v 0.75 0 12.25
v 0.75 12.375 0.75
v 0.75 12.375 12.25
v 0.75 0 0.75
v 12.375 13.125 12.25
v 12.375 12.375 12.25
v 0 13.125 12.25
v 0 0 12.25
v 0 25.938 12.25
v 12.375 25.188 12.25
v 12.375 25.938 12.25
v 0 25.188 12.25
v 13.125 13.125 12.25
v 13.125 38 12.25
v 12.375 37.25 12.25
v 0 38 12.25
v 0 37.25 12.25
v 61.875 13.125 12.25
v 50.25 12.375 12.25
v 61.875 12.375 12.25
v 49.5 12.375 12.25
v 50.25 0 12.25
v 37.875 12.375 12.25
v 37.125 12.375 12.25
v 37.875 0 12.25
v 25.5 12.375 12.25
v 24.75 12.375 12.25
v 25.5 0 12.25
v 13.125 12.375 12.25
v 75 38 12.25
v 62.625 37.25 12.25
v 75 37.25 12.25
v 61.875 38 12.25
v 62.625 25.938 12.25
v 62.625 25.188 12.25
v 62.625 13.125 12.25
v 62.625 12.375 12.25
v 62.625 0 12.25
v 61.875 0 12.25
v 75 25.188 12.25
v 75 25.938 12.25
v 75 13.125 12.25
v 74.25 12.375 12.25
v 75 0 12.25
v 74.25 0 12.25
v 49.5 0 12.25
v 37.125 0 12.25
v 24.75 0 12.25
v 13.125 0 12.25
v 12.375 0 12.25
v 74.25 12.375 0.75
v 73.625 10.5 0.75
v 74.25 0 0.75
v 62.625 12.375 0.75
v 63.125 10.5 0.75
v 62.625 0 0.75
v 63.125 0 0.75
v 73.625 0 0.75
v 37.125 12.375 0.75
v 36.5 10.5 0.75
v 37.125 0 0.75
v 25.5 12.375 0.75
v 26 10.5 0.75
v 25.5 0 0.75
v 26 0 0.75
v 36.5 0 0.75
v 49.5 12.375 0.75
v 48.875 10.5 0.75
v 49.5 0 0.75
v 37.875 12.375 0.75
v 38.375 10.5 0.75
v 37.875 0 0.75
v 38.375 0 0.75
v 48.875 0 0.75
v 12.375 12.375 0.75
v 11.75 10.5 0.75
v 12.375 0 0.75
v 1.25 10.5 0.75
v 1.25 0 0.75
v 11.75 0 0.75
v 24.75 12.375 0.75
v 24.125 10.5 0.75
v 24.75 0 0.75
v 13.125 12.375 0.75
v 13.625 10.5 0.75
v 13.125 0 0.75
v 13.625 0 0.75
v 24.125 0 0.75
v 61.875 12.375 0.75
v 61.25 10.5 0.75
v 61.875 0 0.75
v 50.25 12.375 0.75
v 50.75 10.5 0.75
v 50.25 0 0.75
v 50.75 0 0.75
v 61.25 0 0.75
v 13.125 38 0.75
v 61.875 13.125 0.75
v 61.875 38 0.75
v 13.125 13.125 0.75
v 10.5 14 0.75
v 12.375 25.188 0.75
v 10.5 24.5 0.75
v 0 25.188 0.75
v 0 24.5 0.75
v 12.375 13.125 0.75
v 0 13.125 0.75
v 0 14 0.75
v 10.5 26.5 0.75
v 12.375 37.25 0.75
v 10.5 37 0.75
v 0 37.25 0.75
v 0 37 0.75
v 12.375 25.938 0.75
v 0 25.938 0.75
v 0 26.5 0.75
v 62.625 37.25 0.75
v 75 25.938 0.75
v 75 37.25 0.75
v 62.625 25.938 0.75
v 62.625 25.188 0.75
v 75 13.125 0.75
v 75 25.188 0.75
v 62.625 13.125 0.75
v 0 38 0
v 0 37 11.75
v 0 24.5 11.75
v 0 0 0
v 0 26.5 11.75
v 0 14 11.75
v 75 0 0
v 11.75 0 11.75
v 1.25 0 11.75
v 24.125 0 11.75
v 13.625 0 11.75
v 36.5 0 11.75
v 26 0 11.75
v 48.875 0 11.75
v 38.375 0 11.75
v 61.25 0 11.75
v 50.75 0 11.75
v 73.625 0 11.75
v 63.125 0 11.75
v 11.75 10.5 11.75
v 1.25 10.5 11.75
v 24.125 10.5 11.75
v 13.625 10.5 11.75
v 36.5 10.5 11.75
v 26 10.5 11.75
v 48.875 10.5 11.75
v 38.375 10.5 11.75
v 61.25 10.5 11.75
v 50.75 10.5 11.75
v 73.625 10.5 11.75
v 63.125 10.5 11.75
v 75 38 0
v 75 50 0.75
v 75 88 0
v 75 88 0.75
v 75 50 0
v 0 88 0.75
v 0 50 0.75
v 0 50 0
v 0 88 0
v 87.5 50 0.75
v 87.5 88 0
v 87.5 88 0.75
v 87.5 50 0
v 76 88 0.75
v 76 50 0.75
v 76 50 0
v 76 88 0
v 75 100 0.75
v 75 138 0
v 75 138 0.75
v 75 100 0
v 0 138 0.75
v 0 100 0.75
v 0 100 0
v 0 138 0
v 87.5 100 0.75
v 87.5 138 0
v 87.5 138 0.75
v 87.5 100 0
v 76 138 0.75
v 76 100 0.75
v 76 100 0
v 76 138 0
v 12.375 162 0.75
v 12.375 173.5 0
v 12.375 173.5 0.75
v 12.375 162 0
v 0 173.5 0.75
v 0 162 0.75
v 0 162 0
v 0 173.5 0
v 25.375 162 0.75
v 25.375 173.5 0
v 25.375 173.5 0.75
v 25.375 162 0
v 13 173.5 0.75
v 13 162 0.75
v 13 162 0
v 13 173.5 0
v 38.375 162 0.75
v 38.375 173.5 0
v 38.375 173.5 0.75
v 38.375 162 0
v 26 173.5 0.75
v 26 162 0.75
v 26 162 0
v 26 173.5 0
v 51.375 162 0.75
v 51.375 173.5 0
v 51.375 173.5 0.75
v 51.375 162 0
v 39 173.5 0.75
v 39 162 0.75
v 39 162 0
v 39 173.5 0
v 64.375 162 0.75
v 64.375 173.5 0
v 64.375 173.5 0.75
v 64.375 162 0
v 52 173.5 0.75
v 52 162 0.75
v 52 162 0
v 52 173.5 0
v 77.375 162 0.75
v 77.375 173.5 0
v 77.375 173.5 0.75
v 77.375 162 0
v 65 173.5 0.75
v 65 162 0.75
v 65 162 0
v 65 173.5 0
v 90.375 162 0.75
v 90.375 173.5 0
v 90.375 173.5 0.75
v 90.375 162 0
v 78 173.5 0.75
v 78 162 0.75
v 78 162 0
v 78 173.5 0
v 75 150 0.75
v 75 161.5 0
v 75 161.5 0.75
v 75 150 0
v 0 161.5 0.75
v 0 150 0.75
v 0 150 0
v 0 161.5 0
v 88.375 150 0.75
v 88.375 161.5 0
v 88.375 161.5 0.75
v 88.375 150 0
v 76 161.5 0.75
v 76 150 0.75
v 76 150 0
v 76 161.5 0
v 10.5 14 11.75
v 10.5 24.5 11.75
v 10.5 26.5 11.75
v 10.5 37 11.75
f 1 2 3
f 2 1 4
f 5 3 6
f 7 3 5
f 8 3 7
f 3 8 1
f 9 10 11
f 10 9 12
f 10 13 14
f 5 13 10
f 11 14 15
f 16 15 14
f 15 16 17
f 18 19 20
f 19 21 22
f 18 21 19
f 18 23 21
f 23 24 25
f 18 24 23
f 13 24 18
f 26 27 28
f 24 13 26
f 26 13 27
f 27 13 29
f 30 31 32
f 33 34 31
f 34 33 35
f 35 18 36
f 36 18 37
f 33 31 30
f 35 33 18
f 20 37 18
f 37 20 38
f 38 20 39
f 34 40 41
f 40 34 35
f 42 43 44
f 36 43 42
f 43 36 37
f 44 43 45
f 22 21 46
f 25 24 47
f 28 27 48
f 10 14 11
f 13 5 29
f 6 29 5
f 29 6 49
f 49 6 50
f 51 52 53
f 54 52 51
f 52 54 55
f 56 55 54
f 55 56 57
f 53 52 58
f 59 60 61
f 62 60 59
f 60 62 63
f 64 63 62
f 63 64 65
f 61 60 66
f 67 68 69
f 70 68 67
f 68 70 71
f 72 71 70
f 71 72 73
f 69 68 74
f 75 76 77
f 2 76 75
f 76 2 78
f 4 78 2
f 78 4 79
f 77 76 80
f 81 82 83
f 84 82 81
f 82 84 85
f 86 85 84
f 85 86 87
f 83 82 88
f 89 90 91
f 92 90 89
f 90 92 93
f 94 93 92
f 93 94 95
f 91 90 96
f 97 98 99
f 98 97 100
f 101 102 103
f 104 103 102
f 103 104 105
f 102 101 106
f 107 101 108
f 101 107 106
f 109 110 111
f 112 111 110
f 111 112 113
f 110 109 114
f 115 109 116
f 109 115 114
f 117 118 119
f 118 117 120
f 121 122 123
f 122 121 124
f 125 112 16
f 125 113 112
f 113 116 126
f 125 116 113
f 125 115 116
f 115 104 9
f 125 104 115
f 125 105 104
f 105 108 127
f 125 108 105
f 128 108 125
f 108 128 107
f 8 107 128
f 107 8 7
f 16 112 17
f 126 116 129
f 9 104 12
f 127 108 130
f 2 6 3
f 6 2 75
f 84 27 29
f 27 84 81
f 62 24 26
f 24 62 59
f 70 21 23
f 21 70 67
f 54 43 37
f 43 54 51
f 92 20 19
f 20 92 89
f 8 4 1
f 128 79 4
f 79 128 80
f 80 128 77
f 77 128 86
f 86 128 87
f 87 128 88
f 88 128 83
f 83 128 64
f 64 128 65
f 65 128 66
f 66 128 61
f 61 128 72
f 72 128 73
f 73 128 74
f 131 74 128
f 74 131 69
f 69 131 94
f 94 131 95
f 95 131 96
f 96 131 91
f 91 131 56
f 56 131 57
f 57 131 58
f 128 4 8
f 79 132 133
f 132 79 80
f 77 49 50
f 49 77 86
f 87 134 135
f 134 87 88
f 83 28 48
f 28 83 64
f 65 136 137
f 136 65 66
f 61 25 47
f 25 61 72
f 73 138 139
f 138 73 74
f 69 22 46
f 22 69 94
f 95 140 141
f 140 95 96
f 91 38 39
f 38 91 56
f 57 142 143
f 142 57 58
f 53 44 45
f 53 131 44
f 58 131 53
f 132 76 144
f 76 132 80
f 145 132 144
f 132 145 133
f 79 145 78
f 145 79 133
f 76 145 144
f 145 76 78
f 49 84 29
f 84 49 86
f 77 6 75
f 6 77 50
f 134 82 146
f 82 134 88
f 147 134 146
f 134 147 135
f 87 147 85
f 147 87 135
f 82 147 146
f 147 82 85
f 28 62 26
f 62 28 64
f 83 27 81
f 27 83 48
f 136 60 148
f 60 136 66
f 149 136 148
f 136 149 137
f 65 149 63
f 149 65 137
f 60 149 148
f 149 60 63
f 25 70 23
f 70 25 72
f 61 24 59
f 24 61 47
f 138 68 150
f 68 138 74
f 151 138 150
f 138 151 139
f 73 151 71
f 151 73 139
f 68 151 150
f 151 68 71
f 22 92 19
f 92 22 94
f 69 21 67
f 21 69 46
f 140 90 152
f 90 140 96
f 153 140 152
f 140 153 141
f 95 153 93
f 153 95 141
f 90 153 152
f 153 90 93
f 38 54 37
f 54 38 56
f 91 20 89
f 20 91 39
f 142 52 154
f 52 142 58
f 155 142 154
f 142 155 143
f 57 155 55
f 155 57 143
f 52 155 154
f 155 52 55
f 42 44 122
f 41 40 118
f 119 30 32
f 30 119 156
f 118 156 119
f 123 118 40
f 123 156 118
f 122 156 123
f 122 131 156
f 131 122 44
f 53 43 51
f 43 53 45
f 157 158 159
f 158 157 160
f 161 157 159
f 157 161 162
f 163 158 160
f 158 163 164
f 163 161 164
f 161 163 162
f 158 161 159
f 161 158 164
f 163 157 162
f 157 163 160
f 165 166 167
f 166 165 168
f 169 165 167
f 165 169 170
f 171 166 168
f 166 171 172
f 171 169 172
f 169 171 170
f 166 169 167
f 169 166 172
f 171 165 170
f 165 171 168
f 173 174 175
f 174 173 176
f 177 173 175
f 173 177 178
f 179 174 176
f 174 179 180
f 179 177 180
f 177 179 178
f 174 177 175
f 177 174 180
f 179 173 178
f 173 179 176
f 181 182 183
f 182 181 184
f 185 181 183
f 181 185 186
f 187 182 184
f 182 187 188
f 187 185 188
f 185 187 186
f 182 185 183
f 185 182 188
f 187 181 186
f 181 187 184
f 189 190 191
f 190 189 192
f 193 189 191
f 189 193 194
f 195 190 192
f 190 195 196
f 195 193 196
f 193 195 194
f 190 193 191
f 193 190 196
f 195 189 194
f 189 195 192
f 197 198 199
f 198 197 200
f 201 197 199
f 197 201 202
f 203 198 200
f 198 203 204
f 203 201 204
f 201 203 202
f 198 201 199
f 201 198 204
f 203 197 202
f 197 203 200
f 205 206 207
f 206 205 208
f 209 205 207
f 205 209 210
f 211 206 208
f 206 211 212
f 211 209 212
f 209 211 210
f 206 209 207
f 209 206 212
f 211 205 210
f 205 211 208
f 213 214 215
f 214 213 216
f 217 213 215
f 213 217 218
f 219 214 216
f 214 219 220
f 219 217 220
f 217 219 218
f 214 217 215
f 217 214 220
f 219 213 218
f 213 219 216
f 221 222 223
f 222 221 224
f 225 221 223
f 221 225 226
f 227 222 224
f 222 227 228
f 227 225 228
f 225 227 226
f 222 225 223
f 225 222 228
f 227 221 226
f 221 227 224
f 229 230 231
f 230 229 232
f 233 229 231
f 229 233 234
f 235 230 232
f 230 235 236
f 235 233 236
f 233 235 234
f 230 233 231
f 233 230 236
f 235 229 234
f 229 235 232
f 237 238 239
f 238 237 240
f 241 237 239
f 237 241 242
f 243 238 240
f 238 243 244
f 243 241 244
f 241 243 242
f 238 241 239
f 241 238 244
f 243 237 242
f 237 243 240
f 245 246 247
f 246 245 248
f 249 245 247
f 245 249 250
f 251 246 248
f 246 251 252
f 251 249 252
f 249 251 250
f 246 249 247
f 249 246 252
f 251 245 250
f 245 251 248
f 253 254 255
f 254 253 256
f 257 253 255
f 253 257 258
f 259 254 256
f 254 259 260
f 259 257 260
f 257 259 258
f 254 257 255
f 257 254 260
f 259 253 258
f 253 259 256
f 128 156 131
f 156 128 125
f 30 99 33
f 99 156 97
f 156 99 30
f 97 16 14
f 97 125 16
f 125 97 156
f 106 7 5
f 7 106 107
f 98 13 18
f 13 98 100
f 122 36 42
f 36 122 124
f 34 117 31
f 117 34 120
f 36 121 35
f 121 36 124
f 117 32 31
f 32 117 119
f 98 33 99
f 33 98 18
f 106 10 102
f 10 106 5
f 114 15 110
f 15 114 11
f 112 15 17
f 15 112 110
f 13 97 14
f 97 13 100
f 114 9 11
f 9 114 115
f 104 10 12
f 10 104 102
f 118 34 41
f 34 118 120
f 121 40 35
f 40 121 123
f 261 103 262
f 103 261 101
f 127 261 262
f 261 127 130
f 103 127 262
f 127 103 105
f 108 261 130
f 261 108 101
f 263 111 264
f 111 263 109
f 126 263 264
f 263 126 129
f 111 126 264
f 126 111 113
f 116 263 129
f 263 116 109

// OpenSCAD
// -*- mode: scad; orgstruct-heading-prefix-regexp: "// " -*-
// * Variables
bed = [75, 38, 13]; // outer dimensions
plywood_thickness = .75;
//number_of_cubeies = 4; // interior width = (/ (- 75 (* 5 .75)) 4)17.8125
//number_of_cubeies = 5; // interior width = (/ (- 75 (* 6 .75)) 5)14.1
number_of_cubeies = 6; // interior width = (/ (- 75 (* 7 .75)) 6)11.625
//number_of_cubeies = 7; // interior width = (/ (- 75 (* 8 .75)) 7)9.857142857142858
//cubie_depth = bed.y * (34.0/89.0);
//cubie_depth = bed.y / 2; //19
cubie_depth = 12.375;

//(/ (- 38 12.375 .75 .75 .75) 2)

//cubie_depth = 15;
// * Colors
turquoise = [5/16,14/16,14/16];
blonde = [15.1/16, 13.25/16, 9.25/16];
mustard = [15.1/16, 13/16, 3/16];
sand = [182/256, 180/256, 162/265];

// * Bottom platform
color(turquoise)
cube([bed.x, bed.y, plywood_thickness]);

// * Top platform
*color(blonde)
translate([0,0,bed.z - plywood_thickness])
cube([bed.x, bed.y, plywood_thickness]);

// * Walls
// ** Interior Walls
for (i = [0:number_of_cubeies ]) {
    translate([((bed.x - plywood_thickness) / number_of_cubeies) * i , 0, plywood_thickness])
        cube([plywood_thickness, cubie_depth, bed.z - (2 * plywood_thickness)]);
    // * bins
    if (i < number_of_cubeies)
    color([1,1,1])
        translate([((bed.x - plywood_thickness) / number_of_cubeies) * i + 1.25, 0, plywood_thickness])
        cube([10.5, 10.5, 11]);
}

// ** Cubie back wall
color([.7, .7, 1])
translate([0, cubie_depth, plywood_thickness])
cube([bed.x, plywood_thickness, bed.z - (2 * plywood_thickness)]);

// * Footer cubie
// ** outside
color([.7, .7, 1])
translate([bed.x - cubie_depth, bed.y - plywood_thickness, plywood_thickness])
cube([cubie_depth, plywood_thickness, bed.z - (2 * plywood_thickness)]);
// ** back
translate([bed.x - cubie_depth - plywood_thickness, cubie_depth + plywood_thickness, plywood_thickness])
cube([plywood_thickness, bed.y - cubie_depth - plywood_thickness, bed.z - (2 * plywood_thickness)]);

// * Head cubie
// ** outside
color([.7, .7, 1])
translate([0, bed.y - plywood_thickness, plywood_thickness])
cube([cubie_depth,plywood_thickness, bed.z - (2 * plywood_thickness)]);
// ** back
translate([cubie_depth, cubie_depth + plywood_thickness, plywood_thickness])
cube([plywood_thickness,bed.y - cubie_depth - plywood_thickness, bed.z - (2 * plywood_thickness)]);

// * dividers
color([.7, .7, 1])
translate([0, (bed.y + cubie_depth ) / 2, plywood_thickness])
cube([cubie_depth,plywood_thickness, bed.z - (2 * plywood_thickness)]);

color([.7, .7, 1])
translate([bed.x - cubie_depth, (bed.y + cubie_depth ) / 2, plywood_thickness])
cube([cubie_depth,plywood_thickness, bed.z - (2 * plywood_thickness)]);

// * end boxes
color([1,1,1])
translate([0, 14, plywood_thickness])
cube([10.5, 10.5, 11]);

color([1,1,1])
translate([0, 26.5, plywood_thickness])
cube([10.5, 10.5, 11]);

// Bill of Materials
translate([0, 50, 0])
{
    %cube([96, 48, .75]);
    color(turquoise)
        cube([bed.x, bed.y, plywood_thickness]);
    translate([bed.x + 1,0,0])
        cube([11.5, bed.y, plywood_thickness]);
}

translate([0, 100, 0])
{
    %cube([96, 48, .75]);
    color(turquoise)
        cube([bed.x, bed.y, plywood_thickness]);
    translate([bed.x + 1,0,0])
        cube([11.5, bed.y, plywood_thickness]);
}

translate([0, 150, 0])
{
    %cube([96, 48, .75]);
    color([.7, .7, 1])
        cube([bed.x, bed.z - (2 * plywood_thickness), plywood_thickness]);
    translate([bed.x + 1,0,0])
        cube([12.375, 11.5, plywood_thickness]);
    for (i = [0:6]) {
        translate([i * 13, 11.5 + .5 ,0])
            cube([12.375, 11.5, plywood_thickness]);
    } // short 1 wall (12 3/8 x 11 1/2)
}

//; plywood
//75 x 38  * 2 // top/bottom
//12 3/8 x 11.5 * 11 // walls
//75 x 11.5 // back wall
//24 7/8 x 11.5 * 2 // back wall of ends

//(+ (* 2  (* 75 38))
//   (* 11 (* 12.375 11.5))
//   (* 75 11.5)
//   (* 2  (* 24.875 11.5)))8700.0625
//   (* 96 48) 4608
   
//; trim
//(+ (* 2  (+ 75 38 38 .5))
//   (* 15 11.5)); => 475.5 inches
//   (/ 475.5 12); => 39.625 feet
